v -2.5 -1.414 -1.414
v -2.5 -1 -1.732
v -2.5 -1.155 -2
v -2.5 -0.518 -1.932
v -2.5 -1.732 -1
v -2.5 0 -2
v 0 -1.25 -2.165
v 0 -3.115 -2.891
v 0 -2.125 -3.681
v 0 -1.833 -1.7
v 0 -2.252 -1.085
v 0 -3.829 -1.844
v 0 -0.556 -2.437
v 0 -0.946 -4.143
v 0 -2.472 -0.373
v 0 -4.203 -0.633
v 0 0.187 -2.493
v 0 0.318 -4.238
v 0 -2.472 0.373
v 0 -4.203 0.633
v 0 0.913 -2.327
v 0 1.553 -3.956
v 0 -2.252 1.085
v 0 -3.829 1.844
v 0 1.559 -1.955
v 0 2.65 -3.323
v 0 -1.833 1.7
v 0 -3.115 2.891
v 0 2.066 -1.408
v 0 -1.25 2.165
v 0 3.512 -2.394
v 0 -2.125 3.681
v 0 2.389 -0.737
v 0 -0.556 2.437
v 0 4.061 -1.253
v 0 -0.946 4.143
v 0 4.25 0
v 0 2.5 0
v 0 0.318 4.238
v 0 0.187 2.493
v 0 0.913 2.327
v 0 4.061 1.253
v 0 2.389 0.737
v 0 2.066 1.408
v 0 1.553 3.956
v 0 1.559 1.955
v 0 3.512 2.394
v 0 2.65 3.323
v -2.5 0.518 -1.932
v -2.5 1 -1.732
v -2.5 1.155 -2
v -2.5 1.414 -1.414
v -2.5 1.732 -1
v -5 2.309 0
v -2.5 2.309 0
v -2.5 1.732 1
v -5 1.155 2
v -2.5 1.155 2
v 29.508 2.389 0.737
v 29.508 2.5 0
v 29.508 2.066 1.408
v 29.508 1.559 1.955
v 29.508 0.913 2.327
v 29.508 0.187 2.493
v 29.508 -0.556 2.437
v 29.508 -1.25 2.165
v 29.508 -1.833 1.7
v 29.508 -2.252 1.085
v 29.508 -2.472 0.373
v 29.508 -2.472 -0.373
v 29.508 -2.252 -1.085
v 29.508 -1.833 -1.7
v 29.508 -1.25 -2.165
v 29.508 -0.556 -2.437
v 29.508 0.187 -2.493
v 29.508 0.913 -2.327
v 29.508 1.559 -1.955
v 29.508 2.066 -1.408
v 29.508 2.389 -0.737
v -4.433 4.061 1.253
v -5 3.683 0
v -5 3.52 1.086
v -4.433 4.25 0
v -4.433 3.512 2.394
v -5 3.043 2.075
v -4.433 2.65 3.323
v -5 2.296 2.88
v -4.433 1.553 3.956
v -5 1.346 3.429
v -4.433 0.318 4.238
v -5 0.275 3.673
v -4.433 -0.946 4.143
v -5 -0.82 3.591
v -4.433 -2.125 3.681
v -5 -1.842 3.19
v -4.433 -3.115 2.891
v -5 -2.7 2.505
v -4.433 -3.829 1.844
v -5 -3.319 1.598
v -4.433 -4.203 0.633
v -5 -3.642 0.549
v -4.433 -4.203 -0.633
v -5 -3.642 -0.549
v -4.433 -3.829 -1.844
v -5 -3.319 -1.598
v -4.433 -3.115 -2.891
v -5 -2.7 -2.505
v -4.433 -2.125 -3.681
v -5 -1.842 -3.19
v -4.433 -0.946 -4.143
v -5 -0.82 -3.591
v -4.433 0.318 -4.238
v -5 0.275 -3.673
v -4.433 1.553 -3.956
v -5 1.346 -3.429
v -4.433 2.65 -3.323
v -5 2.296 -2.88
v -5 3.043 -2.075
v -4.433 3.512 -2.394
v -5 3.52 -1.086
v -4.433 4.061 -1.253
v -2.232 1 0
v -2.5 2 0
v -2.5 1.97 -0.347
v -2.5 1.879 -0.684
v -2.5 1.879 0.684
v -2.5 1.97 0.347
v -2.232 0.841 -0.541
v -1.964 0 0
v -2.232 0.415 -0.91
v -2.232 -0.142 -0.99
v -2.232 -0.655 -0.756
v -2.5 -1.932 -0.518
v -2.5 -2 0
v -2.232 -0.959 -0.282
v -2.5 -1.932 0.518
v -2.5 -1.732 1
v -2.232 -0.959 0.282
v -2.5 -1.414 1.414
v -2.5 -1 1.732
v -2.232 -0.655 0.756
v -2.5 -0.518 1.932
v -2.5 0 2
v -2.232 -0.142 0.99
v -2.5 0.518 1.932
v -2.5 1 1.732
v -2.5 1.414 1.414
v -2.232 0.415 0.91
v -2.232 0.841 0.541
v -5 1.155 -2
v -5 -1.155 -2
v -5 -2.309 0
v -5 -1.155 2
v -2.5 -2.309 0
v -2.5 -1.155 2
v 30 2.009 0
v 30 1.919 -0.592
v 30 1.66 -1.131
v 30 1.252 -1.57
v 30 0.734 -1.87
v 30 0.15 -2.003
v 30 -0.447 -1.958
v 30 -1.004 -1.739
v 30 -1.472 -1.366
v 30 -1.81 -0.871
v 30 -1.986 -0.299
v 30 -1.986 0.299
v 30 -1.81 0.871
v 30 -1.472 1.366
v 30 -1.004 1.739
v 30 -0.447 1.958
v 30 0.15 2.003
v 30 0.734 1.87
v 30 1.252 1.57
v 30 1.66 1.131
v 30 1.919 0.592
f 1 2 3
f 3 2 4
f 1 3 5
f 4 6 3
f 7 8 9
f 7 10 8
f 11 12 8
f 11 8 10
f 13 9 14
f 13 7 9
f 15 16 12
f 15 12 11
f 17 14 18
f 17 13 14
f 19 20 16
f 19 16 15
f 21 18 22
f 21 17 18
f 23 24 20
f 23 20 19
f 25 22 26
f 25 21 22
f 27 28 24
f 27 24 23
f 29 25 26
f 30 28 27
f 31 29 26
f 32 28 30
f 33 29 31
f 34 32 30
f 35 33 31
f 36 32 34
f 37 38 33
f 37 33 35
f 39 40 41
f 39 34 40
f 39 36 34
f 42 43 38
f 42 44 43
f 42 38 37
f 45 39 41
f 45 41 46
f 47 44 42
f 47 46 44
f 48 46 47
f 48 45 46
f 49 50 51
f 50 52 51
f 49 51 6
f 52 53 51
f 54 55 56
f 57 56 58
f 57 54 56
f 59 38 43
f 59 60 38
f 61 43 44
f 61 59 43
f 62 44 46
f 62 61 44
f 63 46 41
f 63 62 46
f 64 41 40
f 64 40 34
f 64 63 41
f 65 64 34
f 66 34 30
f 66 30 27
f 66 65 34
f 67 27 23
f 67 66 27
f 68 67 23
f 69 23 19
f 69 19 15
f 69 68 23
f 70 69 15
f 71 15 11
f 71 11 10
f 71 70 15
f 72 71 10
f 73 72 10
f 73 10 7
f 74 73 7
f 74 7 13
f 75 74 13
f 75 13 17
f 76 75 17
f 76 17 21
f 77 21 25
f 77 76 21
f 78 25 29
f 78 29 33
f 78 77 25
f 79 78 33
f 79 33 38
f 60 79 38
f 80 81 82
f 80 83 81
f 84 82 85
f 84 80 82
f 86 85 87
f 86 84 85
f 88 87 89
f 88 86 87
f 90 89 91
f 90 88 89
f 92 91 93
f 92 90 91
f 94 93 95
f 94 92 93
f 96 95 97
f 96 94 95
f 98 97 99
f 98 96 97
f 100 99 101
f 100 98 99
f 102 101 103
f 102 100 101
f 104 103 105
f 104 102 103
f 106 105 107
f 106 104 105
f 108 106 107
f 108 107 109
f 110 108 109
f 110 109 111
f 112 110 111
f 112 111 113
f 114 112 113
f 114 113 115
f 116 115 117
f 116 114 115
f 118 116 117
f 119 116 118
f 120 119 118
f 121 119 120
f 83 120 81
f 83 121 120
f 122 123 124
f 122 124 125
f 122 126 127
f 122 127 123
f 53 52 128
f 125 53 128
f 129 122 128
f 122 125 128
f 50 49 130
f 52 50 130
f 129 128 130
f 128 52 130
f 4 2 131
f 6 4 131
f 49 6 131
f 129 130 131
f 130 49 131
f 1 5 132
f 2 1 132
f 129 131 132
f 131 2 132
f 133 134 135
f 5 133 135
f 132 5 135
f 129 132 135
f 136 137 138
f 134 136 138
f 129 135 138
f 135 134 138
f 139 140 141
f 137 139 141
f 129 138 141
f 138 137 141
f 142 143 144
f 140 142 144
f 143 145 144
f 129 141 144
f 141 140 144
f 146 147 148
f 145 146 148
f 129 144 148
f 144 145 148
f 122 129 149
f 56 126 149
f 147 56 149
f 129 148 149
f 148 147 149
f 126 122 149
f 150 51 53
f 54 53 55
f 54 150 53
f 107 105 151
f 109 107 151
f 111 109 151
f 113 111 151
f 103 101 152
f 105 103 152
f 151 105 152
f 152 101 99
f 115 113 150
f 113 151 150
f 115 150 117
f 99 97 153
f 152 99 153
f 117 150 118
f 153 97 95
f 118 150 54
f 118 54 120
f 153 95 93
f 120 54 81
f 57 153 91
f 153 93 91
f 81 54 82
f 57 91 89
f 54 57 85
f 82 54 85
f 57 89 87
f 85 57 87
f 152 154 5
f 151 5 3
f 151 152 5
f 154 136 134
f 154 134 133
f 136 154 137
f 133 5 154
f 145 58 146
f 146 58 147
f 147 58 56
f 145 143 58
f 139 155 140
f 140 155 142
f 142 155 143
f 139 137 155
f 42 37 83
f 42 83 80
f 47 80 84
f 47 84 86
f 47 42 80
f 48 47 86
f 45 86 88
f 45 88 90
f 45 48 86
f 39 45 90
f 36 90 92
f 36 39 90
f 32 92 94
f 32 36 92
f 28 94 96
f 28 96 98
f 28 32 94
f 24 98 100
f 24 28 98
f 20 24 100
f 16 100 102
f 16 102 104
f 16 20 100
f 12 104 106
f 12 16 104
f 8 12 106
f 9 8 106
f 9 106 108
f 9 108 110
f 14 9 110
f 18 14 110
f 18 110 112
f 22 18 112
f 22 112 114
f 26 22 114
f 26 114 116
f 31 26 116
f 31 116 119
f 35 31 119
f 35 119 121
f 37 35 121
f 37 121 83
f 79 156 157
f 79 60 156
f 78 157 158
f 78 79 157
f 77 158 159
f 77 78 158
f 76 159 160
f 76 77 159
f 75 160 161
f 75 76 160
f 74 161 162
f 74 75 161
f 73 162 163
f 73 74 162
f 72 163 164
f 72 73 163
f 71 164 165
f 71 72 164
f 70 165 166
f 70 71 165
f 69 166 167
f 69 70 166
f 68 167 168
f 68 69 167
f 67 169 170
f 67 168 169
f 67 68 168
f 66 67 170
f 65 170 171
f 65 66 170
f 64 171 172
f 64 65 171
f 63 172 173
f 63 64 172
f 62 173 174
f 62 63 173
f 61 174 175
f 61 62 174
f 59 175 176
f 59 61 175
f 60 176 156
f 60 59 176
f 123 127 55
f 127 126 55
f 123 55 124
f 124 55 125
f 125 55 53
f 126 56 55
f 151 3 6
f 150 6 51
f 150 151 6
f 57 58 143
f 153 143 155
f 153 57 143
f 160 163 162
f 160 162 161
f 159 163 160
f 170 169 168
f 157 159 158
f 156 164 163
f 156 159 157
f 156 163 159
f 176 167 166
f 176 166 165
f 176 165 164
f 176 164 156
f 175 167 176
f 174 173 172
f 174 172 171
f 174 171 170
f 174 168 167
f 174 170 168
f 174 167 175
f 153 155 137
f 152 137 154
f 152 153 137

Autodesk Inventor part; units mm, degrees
sketch "Sketch_2" plane through (0, 0, 0) normal (0, 0, 1) x (1, 0, 0)
  line L0 (30, 0) -> (-5, 0)
  line L1 (-5, 0) -> (-5, 3.6833)
  line L2 (-5, 3.6833) -> (-4.4333, 4.25)
  line L3 (-4.4333, 4.25) -> (0, 4.25)
  line L4 (0, 4.25) -> (0, 2.5)
  line L5 (0, 2.5) -> (29.5085, 2.5)
  line L6 (29.5085, 2.5) -> (30, 2.0085)
  line L7 (30, 2.0085) -> (30, 0)
  line L8 (30, 0) -> (-5, 0)
revolve "Revolution1" add sketch "Sketch_2" angle 360 about axis through (30, 0, 0) along (1, 0, 0)
thread "Thread1" size "M5x0.8" class "6g" standard "ISO Metric profile" length 22 offset 8
sketch "Sketch_4" plane through (0, 0, 0) normal (0, 0, 1) x (1, 0, 0)
  line L0 (-1.9641, 0) -> (-5, 0)
  line L1 (-5, 0) -> (-5, 2)
  line L2 (-5, 2) -> (-2.5, 2)
  line L3 (-2.5, 2) -> (-1.9641, 0)
  line L4 (-1.9641, 0) -> (-5, 0)
revolve "Revolution2" cut sketch "Sketch_4" angle 360 about axis through (-1.9641, 0, 0) along (1, 0, 0)
sketch "Sketch_3" plane through (-5, 0, 0) normal (1, 0, 0) x (0, 0, -1)
  line L0 (-2, 1.1547) -> (-2, -1.1547)
  line L1 (-2, -1.1547) -> (0, -2.3094)
  line L2 (0, -2.3094) -> (2, -1.1547)
  line L3 (2, -1.1547) -> (2, 1.1547)
  line L4 (2, 1.1547) -> (0, 2.3094)
  line L5 (0, 2.3094) -> (-2, 1.1547)
extrude "Extrusion1" cut sketch "Sketch_3" along normal blind 2.5
ref_plane "bolt_XY" through (0, 0, 0) normal (1, 0, 0) x (0, 0, -1)
ref_plane "bolt_YZ" through (0, 0, 0) normal (0, 0, -1) x (0, 1, 0)
ref_plane "bolt_ZX" through (0, 0, 0) normal (0, 1, 0) x (1, 0, 0)
ref_plane "nut_XY" through (30, 0, 0) normal (1, 0, 0) x (0, 0, -1)
ref_plane "nut_YZ" through (30, 0, 0) normal (0, 0, -1) x (0, 1, 0)
ref_plane "nut_ZX" through (30, 0, 0) normal (0, 1, 0) x (1, 0, 0)
properties part number "CBM5-30" material "MISUMI"
